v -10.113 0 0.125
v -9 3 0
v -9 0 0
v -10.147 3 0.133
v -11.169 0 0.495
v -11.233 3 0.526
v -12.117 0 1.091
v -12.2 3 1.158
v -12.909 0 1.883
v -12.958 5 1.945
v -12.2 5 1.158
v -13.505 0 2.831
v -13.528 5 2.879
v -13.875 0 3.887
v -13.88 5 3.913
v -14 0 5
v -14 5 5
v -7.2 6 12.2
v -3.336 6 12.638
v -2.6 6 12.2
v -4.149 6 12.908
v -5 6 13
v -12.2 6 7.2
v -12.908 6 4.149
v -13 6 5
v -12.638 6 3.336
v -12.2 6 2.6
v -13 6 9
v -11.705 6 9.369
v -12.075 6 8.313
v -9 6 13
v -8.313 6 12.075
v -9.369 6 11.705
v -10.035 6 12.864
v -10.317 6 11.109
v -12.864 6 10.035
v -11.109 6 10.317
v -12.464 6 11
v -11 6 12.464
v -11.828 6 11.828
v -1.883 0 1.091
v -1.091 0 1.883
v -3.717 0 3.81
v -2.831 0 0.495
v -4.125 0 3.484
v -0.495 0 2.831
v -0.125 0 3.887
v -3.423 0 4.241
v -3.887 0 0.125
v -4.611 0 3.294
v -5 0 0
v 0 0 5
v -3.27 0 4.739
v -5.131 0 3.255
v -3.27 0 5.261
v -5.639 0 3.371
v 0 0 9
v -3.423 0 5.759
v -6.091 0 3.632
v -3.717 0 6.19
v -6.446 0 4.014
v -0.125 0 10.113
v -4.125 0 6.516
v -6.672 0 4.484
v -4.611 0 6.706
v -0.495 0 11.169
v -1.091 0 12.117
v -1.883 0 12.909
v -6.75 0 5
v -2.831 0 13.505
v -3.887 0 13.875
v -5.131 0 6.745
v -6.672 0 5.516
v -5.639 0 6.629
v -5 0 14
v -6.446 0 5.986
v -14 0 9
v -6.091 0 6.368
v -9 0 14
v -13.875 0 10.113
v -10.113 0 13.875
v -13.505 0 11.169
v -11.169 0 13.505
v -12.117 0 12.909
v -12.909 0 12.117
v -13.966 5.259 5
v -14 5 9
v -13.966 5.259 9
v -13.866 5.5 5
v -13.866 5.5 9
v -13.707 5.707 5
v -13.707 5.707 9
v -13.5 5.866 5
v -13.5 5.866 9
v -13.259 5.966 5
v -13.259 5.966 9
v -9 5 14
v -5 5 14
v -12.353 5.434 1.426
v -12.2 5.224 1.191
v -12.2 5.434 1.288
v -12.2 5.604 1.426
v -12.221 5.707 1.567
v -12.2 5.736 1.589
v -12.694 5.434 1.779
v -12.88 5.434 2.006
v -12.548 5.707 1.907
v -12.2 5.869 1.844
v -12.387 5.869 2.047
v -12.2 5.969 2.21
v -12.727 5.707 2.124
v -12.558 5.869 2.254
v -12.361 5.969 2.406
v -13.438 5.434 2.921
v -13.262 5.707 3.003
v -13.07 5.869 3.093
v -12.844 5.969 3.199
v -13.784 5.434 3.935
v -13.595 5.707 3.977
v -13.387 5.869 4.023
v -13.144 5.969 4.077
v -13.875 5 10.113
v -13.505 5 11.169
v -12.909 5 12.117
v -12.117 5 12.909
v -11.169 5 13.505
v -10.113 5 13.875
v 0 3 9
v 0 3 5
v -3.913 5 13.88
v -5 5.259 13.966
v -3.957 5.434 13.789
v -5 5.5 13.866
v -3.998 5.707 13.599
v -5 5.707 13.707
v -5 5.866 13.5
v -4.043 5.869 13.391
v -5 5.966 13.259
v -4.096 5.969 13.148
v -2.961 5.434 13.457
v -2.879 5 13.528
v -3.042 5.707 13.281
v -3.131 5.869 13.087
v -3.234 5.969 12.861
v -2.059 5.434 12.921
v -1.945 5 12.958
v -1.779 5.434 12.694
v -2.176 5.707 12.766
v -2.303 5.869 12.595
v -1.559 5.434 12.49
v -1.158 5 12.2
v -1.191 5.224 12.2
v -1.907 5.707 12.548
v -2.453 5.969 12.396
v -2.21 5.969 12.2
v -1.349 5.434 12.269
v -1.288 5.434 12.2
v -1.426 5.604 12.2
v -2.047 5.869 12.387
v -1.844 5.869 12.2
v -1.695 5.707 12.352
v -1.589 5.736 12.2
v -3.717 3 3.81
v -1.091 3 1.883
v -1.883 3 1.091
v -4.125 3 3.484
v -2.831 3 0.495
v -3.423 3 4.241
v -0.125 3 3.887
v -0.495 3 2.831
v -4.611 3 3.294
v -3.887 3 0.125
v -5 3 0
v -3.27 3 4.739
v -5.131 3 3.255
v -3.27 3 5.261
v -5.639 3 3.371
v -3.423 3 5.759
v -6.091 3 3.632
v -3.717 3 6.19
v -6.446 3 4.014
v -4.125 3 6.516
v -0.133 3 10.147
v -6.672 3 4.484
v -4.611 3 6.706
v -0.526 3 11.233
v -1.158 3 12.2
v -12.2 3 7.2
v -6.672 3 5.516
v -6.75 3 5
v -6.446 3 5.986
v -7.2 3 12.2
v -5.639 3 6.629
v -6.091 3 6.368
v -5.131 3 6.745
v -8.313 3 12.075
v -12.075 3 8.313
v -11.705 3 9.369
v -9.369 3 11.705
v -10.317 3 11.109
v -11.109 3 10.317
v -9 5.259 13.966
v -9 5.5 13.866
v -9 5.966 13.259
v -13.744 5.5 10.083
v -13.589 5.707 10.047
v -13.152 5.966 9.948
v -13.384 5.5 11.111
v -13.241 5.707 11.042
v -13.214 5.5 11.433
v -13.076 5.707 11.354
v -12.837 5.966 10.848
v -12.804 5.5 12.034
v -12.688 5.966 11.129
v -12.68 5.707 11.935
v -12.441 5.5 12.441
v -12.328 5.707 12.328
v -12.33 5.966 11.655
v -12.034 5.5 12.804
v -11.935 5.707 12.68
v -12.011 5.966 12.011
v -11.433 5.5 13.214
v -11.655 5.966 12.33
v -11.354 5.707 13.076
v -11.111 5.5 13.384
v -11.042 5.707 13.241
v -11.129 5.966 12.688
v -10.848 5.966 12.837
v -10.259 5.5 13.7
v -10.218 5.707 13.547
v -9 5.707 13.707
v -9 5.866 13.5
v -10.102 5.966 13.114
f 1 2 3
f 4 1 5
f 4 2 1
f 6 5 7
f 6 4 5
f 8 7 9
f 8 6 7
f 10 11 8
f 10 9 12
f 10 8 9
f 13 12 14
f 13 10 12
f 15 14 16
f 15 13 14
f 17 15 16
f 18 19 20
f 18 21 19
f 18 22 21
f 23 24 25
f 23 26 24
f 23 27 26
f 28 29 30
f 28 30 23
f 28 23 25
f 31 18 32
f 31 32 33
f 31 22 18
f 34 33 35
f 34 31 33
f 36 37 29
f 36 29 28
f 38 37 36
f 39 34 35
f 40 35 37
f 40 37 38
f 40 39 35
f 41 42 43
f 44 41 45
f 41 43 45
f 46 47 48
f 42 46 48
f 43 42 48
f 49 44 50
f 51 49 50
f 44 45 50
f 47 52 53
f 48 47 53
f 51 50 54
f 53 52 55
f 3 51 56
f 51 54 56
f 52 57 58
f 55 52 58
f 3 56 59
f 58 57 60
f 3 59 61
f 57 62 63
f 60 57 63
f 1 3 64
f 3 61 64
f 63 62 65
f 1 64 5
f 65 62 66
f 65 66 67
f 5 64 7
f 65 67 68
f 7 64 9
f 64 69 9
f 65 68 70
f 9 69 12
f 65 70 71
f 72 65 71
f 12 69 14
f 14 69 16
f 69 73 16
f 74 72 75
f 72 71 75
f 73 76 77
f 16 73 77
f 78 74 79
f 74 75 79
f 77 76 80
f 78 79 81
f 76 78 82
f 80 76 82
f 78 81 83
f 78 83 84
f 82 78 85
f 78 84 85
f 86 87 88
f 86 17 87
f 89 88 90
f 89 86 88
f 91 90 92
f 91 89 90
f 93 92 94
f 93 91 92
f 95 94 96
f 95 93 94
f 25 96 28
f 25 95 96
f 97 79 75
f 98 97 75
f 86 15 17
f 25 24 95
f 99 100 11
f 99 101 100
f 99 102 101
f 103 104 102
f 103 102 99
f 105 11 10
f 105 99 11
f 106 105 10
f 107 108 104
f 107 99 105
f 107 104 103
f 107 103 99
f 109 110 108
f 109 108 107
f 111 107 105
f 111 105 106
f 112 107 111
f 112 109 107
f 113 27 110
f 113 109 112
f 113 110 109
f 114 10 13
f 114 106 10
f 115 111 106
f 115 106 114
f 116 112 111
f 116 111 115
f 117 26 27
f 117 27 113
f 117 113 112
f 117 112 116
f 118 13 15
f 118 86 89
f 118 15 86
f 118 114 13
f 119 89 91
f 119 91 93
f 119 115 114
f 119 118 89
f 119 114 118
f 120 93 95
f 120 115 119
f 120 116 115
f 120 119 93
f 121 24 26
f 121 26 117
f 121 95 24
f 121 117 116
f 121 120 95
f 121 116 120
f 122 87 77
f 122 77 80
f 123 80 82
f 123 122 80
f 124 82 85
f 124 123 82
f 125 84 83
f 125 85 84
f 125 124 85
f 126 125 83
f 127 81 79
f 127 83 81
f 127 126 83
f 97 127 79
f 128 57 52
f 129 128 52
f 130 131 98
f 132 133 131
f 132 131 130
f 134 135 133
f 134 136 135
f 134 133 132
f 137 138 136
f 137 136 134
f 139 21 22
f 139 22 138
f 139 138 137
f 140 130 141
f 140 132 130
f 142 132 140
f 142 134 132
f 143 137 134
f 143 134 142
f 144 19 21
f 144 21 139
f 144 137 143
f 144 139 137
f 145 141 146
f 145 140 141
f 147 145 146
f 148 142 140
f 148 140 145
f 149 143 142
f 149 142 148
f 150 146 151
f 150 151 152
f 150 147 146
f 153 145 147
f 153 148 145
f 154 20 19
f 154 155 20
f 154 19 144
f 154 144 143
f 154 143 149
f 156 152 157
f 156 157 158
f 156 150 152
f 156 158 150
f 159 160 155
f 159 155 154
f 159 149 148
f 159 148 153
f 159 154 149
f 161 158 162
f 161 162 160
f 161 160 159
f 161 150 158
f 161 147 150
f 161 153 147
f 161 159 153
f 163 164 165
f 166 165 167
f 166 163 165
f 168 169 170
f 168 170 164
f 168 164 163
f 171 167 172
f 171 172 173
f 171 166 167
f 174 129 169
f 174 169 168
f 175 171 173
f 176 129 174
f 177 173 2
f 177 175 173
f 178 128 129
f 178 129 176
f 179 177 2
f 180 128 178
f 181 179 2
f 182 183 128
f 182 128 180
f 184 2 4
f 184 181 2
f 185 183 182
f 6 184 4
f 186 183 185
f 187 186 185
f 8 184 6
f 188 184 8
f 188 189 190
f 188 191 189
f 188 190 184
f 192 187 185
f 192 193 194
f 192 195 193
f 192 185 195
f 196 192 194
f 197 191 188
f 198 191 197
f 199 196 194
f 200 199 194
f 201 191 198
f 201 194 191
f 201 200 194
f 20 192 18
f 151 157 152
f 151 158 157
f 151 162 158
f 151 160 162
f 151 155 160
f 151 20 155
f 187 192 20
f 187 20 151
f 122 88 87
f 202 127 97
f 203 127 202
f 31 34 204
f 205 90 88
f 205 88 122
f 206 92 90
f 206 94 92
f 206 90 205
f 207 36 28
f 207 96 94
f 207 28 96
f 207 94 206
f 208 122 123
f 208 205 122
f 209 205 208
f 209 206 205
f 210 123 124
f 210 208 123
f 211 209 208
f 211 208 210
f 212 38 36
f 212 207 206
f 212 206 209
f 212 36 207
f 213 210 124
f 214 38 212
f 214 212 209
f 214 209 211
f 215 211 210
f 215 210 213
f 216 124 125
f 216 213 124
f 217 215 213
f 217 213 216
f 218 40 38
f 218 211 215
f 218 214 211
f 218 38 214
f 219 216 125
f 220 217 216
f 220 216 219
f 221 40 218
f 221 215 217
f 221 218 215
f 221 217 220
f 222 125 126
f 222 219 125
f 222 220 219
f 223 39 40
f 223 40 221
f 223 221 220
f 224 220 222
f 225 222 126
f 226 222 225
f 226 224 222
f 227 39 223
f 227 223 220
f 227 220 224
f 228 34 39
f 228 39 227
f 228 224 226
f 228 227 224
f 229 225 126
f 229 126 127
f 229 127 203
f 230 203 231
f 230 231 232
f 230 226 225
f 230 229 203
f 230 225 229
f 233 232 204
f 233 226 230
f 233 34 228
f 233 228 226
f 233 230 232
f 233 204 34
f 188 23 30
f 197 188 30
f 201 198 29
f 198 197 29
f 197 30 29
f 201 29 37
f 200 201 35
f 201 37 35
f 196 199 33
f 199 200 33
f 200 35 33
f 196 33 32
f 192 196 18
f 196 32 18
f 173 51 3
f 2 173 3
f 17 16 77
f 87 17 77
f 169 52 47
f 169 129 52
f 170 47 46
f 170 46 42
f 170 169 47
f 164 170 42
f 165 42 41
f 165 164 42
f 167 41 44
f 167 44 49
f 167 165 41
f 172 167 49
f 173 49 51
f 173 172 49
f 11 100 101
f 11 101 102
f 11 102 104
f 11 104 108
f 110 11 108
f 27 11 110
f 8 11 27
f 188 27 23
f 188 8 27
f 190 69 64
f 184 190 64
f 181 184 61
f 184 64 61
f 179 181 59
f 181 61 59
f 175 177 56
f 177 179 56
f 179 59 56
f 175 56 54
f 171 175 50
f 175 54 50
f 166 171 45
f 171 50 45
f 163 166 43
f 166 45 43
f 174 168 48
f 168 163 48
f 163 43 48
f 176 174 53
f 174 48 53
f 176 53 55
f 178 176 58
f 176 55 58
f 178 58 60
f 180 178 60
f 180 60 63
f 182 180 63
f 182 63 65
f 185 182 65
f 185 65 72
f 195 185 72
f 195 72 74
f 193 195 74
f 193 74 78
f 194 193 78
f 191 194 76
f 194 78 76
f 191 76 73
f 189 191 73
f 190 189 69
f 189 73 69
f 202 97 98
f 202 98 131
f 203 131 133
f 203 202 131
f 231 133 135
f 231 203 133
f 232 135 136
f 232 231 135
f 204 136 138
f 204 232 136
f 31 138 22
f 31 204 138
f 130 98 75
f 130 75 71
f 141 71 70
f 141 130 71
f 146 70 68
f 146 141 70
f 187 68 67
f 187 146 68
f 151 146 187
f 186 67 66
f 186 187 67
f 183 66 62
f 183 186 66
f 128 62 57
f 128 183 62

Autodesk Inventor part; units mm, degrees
ref_plane "YZ Plane" through (0, 0, 0) normal (1, 0, 0) x (0, 1, 0)
ref_plane "XZ Plane" through (0, 0, 0) normal (0, 1, 0) x (-1, 0, 0)
ref_plane "XY Plane" through (0, 0, 0) normal (0, 0, 1) x (1, 0, 0)
sketch "Sketch1" plane through (0, 0, 0) normal (0, 1, 0) x (-1, 0, 0)
  line L0 (0, 0) -> (14, 0)
  line L1 (14, 0) -> (14, 14)
  line L2 (14, 14) -> (0, 14)
  line L3 (0, 14) -> (0, 0)
  circle A0 centre (5, 5) radius 1.75
  line L4 (0, 0) -> (12.2, 0)
  line L5 (12.2, 0) -> (12.2, 12.2)
  line L6 (12.2, 12.2) -> (0, 12.2)
  line L7 (0, 12.2) -> (0, 0)
  dimension "d0" = 14
  dimension "d1" = 14
  dimension "d2" = 3.5
  dimension "d3" = 5
  dimension "d4" = 5
  dimension "d5" = 12.2
  dimension "d6" = 12.2
extrude "Extrusion3" add sketch "Sketch1" along normal blind 3 contours L3 L6 L5 L0
extrude "Extrusion4" add sketch "Sketch1" along normal blind 6 contours L5 L6 L3 L2 L1 L0
fillet "Fillet1" radius 5 5 edges at (-14, 3, 0) (-14, 3, 14) (-12.2, 4.5, 12.2) (0, 3, 14) (0, 1.5, 0)
fillet "Fillet2" radius 1 5 edges at (-12.5355, 6, 12.5355) (-7, 6, 14) (-2.8787, 6, 13.5277) (-13.5277, 6, 2.8787) (-14, 6, 7)
properties part number "RxBoardMountFoot"
